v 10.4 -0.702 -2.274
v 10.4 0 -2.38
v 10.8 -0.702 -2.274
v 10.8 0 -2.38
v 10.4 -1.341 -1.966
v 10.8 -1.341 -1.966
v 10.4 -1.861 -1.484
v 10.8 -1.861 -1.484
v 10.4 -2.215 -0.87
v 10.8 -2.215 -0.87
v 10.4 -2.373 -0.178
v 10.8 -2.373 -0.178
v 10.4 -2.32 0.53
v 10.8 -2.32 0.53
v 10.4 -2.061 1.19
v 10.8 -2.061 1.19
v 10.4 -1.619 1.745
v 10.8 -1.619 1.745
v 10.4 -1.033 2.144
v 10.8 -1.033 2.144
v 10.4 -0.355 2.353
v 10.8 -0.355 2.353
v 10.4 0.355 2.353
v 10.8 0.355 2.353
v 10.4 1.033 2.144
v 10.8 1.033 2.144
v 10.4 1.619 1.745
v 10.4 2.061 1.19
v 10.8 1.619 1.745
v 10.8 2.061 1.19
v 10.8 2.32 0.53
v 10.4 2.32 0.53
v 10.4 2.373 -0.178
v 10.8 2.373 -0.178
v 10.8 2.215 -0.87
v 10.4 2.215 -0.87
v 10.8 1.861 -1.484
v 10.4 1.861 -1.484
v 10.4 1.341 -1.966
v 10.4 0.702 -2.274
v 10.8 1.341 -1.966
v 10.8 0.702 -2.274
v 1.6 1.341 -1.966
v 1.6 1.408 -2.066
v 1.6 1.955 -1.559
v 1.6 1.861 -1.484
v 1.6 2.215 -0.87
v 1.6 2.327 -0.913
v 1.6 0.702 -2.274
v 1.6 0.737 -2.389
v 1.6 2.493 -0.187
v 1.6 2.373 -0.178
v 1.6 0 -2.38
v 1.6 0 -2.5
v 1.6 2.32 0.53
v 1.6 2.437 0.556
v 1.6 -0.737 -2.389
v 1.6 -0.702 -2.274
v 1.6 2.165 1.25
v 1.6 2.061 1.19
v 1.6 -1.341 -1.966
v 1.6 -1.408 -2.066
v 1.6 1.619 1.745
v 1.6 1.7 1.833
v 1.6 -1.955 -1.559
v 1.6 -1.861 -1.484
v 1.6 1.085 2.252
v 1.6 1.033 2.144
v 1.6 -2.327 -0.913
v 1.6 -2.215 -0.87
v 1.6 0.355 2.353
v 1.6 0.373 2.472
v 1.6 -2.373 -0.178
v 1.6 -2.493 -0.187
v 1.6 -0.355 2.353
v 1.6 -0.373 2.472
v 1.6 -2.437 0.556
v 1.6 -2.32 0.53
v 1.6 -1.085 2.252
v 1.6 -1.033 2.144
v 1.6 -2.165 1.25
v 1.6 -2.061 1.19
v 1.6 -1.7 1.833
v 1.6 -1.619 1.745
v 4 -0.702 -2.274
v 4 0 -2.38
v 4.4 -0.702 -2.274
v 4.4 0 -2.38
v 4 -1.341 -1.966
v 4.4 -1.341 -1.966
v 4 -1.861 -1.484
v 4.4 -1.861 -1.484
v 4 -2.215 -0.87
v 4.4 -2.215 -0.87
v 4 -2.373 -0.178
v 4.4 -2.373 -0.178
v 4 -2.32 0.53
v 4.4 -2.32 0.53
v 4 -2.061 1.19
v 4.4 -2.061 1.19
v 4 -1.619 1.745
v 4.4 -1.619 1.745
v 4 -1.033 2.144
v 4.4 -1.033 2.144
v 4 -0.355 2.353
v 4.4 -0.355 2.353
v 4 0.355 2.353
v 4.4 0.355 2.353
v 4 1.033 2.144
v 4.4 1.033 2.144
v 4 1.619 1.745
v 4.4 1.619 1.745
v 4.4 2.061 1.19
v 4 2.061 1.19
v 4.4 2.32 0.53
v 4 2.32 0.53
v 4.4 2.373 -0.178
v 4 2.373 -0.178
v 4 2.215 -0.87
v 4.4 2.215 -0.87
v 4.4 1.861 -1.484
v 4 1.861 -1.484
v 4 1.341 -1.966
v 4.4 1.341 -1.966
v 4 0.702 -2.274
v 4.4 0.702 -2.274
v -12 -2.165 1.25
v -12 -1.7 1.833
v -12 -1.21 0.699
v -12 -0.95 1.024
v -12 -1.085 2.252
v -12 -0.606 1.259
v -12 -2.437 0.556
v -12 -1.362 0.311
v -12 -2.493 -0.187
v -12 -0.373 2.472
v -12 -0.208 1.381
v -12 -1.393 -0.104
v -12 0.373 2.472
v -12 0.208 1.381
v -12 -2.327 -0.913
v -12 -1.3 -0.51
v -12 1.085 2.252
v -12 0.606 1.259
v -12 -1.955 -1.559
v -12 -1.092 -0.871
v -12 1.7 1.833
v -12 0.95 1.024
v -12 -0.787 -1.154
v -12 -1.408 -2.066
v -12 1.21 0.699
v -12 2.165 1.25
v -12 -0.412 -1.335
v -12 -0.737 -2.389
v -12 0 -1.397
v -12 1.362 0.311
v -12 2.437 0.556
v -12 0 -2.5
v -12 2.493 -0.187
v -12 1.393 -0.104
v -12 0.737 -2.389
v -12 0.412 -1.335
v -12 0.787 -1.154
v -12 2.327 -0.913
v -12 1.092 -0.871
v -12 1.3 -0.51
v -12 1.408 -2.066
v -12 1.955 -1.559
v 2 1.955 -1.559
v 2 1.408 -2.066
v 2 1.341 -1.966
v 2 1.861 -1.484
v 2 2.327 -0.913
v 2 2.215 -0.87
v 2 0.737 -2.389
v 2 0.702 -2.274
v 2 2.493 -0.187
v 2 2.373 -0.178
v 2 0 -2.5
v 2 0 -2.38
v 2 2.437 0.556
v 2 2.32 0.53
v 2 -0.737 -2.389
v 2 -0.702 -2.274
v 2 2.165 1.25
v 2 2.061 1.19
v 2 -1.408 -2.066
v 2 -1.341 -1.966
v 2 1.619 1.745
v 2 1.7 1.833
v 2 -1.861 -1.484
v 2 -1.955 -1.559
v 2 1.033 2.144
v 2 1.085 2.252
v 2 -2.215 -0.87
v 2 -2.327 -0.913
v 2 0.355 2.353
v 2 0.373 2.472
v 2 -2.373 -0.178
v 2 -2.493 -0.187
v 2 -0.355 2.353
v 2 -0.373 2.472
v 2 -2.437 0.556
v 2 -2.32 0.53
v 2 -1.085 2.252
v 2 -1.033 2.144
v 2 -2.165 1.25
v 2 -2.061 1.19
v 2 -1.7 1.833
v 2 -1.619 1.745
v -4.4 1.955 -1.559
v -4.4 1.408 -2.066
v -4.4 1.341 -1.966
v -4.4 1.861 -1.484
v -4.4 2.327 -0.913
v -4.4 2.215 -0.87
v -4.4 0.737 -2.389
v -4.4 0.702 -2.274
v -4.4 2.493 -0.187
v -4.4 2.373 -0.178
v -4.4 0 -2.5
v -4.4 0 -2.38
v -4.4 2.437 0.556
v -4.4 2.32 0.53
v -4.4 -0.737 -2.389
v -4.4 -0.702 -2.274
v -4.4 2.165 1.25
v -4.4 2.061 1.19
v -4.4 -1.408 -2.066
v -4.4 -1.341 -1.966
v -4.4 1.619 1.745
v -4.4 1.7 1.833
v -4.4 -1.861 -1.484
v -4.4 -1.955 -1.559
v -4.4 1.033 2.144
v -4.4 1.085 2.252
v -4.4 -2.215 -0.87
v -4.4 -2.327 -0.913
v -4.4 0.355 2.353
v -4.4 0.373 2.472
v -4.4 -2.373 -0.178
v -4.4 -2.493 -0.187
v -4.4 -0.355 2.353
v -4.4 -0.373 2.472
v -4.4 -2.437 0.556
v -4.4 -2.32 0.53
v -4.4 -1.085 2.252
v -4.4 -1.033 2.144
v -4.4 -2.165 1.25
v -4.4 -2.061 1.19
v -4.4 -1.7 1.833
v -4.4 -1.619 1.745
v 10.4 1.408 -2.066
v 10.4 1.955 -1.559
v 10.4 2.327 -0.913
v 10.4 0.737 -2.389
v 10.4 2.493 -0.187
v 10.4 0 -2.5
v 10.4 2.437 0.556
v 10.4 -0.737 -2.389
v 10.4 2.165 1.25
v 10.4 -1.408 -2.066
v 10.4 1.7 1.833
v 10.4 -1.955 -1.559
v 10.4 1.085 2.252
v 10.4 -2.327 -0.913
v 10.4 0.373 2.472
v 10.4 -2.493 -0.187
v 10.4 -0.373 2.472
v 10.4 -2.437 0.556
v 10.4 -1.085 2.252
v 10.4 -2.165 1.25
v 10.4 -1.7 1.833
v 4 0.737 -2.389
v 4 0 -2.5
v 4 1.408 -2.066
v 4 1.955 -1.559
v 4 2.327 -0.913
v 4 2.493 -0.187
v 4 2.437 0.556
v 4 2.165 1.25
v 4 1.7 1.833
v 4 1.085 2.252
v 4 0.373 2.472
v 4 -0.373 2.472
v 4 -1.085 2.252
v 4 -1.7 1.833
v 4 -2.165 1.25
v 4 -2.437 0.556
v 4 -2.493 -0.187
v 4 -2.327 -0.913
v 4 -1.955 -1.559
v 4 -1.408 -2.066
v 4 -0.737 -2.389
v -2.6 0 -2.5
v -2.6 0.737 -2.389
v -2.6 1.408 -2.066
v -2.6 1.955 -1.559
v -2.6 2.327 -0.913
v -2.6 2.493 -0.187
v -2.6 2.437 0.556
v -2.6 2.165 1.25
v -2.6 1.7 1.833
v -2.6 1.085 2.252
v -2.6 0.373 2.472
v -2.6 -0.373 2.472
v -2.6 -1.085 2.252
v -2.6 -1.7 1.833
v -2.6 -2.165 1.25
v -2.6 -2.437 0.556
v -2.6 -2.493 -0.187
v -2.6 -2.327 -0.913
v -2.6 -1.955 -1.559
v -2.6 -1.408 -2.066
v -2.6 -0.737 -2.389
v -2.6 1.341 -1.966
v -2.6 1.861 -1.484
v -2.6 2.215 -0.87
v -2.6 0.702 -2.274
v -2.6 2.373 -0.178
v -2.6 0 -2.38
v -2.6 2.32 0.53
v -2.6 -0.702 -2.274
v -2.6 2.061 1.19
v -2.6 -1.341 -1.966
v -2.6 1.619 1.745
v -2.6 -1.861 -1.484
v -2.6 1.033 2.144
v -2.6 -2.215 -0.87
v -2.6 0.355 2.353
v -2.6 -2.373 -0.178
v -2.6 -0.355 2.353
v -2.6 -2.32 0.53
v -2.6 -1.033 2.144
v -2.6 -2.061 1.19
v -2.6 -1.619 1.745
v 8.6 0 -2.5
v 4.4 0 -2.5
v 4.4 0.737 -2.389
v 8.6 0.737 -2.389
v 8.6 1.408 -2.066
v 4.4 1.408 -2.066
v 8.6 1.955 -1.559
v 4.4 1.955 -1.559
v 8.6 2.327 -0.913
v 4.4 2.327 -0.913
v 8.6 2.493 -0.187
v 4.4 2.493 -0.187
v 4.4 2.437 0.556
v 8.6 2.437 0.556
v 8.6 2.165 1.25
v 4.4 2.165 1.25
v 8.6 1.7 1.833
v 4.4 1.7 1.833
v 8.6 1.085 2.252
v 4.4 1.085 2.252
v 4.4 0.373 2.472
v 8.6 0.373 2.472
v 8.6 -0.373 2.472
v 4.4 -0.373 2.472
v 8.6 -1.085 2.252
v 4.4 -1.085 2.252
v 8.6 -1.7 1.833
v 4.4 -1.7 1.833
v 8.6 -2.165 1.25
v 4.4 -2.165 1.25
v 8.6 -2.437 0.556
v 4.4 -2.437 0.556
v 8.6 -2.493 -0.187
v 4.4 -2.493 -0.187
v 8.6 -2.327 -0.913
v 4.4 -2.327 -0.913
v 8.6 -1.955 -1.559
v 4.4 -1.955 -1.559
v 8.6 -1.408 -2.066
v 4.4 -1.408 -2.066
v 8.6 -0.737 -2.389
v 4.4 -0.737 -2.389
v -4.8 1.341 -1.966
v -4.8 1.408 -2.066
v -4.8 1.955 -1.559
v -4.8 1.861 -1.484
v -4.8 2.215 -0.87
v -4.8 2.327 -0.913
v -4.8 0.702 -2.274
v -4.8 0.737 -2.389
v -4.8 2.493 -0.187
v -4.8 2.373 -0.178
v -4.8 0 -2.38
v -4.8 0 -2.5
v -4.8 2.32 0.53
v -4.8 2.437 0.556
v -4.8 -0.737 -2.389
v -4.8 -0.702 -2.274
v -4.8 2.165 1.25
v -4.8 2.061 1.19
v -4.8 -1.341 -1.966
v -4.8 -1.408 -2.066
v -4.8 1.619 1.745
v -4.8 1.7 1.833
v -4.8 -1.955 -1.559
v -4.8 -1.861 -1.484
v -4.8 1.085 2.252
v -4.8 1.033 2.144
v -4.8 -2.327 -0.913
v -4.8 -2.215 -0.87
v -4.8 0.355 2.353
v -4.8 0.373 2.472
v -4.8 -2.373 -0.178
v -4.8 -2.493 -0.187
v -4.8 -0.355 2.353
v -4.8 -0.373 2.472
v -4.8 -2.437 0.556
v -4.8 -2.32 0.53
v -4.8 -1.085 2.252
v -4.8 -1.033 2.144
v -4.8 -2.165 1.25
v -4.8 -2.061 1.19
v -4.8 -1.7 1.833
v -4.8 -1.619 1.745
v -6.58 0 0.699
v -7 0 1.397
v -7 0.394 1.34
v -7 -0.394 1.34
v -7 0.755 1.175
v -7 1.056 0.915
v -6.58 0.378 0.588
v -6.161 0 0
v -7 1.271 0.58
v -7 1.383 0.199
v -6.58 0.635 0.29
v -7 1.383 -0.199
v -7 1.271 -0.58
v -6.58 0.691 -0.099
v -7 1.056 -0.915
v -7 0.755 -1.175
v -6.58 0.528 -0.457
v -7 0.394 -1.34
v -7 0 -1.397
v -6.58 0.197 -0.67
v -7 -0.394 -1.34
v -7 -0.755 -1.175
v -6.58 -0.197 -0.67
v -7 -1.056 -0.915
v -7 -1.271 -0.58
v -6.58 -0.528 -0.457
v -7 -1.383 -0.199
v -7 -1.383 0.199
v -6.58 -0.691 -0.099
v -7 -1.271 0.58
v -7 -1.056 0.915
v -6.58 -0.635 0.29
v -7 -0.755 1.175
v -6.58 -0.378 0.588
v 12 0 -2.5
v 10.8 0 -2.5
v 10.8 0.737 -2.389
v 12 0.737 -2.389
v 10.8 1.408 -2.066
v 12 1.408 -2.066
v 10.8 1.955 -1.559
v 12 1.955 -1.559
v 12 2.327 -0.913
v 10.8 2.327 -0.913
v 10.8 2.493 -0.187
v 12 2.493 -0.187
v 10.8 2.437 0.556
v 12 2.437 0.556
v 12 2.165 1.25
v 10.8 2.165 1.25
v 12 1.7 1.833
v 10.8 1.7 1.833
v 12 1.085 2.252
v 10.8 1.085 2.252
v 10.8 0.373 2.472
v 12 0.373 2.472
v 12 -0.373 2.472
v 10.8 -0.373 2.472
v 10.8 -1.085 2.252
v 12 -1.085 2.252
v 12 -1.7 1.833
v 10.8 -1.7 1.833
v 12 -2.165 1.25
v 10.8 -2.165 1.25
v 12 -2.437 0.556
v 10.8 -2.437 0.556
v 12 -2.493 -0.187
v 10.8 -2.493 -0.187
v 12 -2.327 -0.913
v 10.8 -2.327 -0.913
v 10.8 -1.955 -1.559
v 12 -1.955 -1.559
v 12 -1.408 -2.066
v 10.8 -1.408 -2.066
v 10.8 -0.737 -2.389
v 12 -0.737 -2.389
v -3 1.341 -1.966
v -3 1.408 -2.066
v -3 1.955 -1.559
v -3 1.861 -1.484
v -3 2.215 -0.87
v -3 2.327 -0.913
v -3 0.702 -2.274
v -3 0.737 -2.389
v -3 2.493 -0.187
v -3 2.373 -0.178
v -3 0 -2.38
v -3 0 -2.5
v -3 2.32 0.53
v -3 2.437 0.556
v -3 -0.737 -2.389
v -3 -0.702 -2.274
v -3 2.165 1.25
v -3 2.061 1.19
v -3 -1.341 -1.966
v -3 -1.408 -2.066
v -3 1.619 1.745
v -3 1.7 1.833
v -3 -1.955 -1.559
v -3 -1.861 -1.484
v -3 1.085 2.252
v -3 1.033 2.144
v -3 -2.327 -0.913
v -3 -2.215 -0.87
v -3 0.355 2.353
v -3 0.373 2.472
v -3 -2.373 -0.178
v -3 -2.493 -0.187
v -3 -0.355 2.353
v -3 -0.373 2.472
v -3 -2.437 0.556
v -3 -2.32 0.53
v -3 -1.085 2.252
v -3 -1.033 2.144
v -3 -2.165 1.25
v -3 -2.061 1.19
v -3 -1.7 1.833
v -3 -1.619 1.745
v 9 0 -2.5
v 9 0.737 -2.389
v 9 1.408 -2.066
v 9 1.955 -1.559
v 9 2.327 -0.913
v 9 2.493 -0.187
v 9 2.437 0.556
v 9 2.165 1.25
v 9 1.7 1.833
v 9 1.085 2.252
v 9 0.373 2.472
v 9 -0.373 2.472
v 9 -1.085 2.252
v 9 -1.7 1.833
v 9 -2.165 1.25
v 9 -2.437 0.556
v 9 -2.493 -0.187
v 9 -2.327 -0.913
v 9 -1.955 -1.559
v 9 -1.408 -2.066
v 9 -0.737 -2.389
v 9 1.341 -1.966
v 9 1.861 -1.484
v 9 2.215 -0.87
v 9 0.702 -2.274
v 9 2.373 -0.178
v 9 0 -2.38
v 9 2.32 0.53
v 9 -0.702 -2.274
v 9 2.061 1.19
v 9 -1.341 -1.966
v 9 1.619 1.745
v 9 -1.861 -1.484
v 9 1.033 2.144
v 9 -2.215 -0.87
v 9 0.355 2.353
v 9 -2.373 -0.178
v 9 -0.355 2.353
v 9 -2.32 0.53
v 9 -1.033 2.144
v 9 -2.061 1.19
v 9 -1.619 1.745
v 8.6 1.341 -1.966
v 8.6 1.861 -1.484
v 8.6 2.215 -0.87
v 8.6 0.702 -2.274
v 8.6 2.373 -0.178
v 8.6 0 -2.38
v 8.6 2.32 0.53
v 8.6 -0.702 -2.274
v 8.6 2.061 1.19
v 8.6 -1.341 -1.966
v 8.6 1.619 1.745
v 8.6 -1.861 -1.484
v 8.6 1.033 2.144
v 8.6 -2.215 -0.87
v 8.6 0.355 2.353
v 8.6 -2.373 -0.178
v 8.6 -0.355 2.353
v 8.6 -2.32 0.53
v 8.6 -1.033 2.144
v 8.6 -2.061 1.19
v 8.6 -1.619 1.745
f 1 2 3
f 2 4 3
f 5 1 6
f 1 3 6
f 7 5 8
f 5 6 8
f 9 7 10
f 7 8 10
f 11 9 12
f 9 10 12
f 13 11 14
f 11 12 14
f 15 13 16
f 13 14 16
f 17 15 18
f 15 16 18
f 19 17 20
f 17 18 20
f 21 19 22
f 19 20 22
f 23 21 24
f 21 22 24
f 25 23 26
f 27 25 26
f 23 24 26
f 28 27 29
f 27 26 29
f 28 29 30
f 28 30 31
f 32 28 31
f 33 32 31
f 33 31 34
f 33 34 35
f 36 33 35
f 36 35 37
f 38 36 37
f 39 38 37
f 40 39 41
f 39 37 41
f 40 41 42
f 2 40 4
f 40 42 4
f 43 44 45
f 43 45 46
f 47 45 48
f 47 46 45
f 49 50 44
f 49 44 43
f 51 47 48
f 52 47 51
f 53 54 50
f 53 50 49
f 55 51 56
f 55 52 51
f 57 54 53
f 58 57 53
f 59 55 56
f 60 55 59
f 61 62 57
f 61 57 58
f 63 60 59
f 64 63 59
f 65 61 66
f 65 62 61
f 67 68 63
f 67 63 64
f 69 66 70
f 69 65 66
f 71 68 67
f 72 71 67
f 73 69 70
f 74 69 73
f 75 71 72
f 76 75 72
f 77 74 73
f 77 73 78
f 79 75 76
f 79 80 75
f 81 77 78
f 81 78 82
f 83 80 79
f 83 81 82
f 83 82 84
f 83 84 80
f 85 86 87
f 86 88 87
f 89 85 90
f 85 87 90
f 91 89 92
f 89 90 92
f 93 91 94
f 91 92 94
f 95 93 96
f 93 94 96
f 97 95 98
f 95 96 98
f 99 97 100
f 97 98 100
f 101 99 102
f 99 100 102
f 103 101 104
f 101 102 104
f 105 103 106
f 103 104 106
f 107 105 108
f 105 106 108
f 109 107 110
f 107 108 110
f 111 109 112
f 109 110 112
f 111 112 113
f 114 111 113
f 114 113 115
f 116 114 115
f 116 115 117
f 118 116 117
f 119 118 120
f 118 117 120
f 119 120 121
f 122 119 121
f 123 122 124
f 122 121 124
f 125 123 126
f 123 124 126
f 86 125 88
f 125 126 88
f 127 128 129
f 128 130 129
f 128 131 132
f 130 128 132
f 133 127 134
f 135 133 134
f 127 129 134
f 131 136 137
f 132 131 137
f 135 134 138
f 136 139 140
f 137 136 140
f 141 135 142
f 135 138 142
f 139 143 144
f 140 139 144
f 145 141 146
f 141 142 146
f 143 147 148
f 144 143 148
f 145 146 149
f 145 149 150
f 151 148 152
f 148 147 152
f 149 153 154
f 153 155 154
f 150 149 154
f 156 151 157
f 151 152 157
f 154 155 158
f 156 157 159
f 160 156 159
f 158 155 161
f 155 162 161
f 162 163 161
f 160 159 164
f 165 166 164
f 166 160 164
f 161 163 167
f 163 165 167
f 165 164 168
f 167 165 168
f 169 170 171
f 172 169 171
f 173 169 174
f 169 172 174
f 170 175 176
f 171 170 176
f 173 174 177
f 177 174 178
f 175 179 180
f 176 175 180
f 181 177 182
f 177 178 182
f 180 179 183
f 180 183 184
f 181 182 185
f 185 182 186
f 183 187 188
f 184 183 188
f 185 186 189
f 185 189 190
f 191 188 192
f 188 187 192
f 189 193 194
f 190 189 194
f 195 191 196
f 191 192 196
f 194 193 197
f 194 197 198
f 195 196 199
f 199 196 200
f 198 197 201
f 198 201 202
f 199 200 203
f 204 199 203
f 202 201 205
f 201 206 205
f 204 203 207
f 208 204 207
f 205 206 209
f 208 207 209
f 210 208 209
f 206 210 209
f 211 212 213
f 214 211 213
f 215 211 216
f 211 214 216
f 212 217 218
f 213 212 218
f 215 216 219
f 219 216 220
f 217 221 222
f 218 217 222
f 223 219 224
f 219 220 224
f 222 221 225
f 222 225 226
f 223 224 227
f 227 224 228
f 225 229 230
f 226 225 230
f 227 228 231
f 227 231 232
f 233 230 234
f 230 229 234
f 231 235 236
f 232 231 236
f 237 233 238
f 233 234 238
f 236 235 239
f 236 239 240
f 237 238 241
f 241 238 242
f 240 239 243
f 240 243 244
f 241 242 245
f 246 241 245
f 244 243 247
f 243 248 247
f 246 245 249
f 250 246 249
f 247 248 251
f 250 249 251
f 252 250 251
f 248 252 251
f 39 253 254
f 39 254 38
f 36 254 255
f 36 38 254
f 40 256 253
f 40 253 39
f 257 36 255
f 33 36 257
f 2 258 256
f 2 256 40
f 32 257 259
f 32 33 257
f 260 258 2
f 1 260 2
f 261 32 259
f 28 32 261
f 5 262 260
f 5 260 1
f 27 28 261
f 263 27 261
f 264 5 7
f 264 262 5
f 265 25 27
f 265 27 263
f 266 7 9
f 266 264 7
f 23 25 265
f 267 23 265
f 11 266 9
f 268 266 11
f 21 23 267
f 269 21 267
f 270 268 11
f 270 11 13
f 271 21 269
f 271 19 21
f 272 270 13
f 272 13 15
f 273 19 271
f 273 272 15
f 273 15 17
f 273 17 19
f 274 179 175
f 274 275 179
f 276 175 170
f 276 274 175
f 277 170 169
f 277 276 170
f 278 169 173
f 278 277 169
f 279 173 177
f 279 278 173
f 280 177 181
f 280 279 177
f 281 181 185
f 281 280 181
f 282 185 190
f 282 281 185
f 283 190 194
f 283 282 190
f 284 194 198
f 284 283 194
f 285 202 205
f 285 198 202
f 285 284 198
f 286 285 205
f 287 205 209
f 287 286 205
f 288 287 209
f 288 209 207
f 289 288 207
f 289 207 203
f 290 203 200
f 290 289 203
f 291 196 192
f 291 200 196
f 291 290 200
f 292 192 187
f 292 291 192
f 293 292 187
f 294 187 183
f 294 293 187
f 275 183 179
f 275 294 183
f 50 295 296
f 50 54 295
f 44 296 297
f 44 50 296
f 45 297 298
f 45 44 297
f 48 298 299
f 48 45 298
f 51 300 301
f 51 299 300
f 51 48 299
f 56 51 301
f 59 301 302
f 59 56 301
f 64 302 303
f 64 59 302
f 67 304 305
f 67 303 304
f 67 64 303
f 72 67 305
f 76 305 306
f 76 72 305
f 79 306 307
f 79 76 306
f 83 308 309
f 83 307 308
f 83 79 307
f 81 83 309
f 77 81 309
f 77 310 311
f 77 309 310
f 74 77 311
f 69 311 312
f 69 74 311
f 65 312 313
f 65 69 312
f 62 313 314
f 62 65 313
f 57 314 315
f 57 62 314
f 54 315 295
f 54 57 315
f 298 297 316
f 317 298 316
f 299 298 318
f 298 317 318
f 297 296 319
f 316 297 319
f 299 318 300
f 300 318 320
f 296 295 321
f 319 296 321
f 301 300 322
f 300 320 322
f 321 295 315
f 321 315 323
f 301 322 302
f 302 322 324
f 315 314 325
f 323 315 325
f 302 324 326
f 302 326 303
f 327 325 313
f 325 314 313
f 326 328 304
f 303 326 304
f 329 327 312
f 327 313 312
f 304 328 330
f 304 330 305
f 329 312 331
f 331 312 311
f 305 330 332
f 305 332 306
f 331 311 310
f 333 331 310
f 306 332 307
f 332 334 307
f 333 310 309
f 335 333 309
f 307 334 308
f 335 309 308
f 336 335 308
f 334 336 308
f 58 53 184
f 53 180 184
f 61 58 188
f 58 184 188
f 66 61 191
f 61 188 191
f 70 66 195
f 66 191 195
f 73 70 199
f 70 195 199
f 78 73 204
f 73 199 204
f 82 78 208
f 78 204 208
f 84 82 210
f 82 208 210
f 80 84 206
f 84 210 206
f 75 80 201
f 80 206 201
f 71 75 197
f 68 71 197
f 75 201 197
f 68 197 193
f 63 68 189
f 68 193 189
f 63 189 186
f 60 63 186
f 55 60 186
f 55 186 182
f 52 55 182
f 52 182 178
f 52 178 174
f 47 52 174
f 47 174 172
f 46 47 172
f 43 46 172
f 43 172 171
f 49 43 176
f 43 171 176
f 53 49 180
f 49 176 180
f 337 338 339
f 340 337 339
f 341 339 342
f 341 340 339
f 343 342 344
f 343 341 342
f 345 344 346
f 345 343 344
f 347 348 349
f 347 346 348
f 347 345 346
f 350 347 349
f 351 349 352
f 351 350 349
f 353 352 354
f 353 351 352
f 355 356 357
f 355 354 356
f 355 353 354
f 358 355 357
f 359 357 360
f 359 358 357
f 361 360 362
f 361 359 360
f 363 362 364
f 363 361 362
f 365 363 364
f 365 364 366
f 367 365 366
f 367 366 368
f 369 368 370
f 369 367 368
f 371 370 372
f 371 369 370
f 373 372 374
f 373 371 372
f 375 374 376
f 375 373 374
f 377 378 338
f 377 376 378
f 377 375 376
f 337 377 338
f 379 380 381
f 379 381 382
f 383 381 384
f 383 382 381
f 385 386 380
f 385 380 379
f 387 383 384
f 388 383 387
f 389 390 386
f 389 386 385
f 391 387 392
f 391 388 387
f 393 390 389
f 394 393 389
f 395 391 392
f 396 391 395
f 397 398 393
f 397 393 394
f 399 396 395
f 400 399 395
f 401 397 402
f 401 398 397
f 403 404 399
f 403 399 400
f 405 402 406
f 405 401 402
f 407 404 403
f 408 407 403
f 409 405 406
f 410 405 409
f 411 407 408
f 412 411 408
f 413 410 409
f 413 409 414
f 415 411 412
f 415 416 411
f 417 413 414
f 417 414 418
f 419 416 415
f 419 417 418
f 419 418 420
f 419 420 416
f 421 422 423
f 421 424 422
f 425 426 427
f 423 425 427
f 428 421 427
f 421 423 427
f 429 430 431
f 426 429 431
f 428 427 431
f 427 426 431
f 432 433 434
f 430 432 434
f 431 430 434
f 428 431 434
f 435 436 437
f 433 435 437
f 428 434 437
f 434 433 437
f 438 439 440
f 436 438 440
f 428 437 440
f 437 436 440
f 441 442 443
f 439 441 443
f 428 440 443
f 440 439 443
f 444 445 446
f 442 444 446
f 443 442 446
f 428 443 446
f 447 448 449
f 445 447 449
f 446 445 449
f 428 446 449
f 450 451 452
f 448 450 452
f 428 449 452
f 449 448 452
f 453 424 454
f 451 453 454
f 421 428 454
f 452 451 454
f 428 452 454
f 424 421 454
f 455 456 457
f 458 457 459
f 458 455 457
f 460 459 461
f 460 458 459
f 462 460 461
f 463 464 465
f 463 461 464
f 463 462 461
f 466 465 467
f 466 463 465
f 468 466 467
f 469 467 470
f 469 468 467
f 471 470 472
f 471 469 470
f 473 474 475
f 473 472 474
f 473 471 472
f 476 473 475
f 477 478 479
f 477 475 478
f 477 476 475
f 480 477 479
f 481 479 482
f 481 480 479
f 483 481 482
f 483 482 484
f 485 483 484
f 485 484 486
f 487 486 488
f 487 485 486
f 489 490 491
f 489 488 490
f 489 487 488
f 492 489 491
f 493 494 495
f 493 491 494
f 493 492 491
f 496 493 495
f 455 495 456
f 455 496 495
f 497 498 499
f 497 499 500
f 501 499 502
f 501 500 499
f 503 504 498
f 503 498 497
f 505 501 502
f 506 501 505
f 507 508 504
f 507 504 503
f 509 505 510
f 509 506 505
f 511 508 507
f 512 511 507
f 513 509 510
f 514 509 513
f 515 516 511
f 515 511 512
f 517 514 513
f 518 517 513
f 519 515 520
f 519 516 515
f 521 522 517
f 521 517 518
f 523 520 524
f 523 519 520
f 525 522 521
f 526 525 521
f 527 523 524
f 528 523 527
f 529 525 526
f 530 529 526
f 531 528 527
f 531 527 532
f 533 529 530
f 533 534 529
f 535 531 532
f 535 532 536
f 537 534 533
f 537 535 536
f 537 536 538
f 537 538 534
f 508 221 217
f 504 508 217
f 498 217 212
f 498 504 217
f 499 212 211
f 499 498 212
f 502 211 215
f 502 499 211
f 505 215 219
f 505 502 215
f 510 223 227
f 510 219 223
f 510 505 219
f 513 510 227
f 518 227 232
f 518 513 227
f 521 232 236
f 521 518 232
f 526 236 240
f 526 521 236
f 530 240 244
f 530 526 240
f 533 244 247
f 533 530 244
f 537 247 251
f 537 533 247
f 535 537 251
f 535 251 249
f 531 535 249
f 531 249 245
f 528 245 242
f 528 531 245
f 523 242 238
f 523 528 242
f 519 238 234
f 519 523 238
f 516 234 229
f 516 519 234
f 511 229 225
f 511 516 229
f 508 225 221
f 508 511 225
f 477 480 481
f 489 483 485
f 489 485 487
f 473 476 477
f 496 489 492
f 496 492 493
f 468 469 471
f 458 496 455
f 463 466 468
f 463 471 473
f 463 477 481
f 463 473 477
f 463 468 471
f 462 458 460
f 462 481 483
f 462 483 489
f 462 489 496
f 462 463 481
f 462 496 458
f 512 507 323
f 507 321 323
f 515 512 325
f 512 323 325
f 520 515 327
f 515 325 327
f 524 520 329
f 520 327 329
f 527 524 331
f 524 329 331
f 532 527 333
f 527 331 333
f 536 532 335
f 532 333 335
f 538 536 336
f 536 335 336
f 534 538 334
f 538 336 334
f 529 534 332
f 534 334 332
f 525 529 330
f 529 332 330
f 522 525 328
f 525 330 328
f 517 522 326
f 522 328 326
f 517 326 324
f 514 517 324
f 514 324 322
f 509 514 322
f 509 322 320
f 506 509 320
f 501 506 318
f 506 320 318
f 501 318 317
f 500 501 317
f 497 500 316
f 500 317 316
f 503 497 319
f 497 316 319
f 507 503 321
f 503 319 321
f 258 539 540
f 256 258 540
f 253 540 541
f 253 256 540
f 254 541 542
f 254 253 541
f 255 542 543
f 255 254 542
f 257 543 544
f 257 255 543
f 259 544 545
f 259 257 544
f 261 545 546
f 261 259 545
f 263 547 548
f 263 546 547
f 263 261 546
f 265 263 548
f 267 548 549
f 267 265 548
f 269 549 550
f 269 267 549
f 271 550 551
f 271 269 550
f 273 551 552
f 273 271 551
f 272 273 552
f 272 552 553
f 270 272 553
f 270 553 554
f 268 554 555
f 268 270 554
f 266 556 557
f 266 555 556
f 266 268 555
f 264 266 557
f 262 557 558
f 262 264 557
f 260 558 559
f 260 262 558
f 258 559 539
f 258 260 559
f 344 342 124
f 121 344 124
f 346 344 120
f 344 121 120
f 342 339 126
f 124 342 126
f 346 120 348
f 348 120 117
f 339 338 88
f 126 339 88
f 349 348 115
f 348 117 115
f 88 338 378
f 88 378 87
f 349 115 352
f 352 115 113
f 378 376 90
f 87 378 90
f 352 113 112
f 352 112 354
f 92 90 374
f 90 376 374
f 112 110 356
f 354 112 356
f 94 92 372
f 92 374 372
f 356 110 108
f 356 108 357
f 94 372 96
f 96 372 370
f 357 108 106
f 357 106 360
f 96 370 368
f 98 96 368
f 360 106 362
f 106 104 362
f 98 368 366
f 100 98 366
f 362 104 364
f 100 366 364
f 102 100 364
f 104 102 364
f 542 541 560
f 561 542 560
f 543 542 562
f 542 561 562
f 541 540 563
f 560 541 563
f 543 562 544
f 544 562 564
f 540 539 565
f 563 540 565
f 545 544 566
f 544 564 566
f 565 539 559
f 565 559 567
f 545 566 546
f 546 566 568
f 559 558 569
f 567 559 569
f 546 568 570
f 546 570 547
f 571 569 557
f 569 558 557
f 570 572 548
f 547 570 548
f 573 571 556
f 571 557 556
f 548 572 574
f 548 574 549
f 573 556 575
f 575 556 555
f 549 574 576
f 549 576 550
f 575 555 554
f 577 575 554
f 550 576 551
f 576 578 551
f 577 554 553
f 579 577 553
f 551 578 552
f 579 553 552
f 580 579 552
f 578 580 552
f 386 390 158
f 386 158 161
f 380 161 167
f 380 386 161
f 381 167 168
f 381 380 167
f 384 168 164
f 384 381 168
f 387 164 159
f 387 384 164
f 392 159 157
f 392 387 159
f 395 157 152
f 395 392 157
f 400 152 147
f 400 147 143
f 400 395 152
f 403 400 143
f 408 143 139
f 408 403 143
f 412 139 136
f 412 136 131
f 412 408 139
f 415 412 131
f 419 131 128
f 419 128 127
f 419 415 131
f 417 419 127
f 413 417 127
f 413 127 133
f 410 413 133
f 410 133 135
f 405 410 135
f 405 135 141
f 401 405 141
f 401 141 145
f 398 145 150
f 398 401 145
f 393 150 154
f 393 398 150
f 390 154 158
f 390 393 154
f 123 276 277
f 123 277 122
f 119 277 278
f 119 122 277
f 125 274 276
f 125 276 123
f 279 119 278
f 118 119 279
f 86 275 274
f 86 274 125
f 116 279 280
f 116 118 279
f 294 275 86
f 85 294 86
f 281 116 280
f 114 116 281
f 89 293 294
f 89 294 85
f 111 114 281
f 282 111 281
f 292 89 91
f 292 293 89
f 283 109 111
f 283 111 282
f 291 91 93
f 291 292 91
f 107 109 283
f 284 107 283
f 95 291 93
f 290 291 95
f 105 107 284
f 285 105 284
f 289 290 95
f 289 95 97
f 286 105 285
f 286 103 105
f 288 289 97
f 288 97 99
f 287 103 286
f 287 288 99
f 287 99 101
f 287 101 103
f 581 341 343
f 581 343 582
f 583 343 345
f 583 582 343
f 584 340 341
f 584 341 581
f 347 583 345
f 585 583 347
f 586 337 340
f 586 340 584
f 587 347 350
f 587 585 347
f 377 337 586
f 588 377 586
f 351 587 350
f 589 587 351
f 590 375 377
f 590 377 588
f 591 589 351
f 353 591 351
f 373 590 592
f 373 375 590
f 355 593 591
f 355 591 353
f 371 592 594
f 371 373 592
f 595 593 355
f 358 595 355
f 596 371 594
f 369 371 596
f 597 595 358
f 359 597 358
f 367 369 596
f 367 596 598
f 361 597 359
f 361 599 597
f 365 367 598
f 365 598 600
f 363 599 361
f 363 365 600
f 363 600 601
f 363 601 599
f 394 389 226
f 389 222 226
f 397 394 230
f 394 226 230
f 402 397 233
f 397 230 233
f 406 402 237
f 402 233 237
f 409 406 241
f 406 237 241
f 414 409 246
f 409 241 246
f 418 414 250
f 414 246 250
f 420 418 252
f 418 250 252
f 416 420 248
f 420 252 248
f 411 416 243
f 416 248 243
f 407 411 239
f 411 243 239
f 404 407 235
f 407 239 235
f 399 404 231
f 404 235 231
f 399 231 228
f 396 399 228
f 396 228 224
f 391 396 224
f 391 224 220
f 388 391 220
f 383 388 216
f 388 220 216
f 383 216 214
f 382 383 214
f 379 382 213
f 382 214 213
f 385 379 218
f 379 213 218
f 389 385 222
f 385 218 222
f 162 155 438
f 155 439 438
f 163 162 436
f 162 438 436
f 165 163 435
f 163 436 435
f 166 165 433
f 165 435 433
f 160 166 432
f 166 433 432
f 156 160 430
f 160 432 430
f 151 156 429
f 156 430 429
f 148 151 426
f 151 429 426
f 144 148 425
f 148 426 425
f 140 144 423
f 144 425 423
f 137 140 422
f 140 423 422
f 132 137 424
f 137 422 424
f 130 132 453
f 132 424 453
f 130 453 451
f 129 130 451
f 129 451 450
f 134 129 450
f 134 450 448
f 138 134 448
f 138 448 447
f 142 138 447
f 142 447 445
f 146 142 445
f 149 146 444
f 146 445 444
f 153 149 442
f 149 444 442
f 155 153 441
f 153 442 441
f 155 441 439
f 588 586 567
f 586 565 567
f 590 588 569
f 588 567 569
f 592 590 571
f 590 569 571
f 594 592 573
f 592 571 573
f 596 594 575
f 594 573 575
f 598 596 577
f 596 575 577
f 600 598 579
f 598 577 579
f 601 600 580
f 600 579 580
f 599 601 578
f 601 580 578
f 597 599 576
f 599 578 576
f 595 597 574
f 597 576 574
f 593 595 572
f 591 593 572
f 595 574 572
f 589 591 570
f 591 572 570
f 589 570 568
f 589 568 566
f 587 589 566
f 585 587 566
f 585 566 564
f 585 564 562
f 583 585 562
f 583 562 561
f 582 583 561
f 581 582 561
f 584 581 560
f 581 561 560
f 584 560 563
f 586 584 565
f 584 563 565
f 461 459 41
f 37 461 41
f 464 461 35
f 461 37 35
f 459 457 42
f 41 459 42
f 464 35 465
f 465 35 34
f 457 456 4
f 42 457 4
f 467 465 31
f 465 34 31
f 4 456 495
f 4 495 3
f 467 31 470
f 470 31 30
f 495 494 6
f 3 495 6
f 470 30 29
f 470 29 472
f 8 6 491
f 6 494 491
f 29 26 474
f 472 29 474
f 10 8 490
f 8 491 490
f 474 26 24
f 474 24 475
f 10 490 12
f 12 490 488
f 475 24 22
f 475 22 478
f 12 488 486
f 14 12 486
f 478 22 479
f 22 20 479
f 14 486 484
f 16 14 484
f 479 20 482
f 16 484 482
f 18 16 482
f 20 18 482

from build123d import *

# Parameters (mm, degrees)
SKETCH1_R                 = 2.5
BOSS_EXTRUDE1_DEPTH       = 12
F_3_CLEARANCE_HOLE1_D     = 2.794
F_3_CLEARANCE_HOLE1_DEPTH = 5
F_3_CLEARANCE_HOLE1_TIP   = 0.839402285
SKETCH4_W                 = 0.4
SKETCH4_H                 = 0.12


with BuildPart() as part:
    # Sketch1 → Boss-Extrude1 (new, symmetric)
    with BuildSketch(Plane(origin=(0, 0, 0), x_dir=(0, 0, -1), z_dir=(1, 0, 0))):
        Circle(SKETCH1_R)
    extrude(amount=BOSS_EXTRUDE1_DEPTH, both=True)

    # #3 Clearance Hole1
    with Locations(Plane.ZY.offset(12)):
        with Locations((0, 0)):
            Hole(F_3_CLEARANCE_HOLE1_D / 2, depth=F_3_CLEARANCE_HOLE1_DEPTH)
            with Locations((0, 0, -(F_3_CLEARANCE_HOLE1_DEPTH + F_3_CLEARANCE_HOLE1_TIP / 2))):  # 118° drill point
                Cone(0, F_3_CLEARANCE_HOLE1_D / 2, F_3_CLEARANCE_HOLE1_TIP, mode=Mode.SUBTRACT)

    # Sketch4 → Cut-Revolve1 (revolve, cut)
    with BuildSketch(Plane(origin=(0, 0, 0), x_dir=(1, 0, 0), z_dir=(0, 1, 0))):
        with Locations((10.6, 2.44)):
            Rectangle(SKETCH4_W, SKETCH4_H)
        with Locations((8.8, 2.44)):
            Rectangle(SKETCH4_W, SKETCH4_H)
        with Locations((-2.8, 2.44)):
            Rectangle(SKETCH4_W, SKETCH4_H)
        with Locations((-4.6, 2.44)):
            Rectangle(SKETCH4_W, SKETCH4_H)
        with Locations((1.8, 2.44)):
            Rectangle(SKETCH4_W, SKETCH4_H)
        with Locations((4.2, 2.44)):
            Rectangle(SKETCH4_W, SKETCH4_H)
    revolve(axis=Axis((13.2, 0, 0), (-1, 0, 0)), mode=Mode.SUBTRACT)


solid = part.part
